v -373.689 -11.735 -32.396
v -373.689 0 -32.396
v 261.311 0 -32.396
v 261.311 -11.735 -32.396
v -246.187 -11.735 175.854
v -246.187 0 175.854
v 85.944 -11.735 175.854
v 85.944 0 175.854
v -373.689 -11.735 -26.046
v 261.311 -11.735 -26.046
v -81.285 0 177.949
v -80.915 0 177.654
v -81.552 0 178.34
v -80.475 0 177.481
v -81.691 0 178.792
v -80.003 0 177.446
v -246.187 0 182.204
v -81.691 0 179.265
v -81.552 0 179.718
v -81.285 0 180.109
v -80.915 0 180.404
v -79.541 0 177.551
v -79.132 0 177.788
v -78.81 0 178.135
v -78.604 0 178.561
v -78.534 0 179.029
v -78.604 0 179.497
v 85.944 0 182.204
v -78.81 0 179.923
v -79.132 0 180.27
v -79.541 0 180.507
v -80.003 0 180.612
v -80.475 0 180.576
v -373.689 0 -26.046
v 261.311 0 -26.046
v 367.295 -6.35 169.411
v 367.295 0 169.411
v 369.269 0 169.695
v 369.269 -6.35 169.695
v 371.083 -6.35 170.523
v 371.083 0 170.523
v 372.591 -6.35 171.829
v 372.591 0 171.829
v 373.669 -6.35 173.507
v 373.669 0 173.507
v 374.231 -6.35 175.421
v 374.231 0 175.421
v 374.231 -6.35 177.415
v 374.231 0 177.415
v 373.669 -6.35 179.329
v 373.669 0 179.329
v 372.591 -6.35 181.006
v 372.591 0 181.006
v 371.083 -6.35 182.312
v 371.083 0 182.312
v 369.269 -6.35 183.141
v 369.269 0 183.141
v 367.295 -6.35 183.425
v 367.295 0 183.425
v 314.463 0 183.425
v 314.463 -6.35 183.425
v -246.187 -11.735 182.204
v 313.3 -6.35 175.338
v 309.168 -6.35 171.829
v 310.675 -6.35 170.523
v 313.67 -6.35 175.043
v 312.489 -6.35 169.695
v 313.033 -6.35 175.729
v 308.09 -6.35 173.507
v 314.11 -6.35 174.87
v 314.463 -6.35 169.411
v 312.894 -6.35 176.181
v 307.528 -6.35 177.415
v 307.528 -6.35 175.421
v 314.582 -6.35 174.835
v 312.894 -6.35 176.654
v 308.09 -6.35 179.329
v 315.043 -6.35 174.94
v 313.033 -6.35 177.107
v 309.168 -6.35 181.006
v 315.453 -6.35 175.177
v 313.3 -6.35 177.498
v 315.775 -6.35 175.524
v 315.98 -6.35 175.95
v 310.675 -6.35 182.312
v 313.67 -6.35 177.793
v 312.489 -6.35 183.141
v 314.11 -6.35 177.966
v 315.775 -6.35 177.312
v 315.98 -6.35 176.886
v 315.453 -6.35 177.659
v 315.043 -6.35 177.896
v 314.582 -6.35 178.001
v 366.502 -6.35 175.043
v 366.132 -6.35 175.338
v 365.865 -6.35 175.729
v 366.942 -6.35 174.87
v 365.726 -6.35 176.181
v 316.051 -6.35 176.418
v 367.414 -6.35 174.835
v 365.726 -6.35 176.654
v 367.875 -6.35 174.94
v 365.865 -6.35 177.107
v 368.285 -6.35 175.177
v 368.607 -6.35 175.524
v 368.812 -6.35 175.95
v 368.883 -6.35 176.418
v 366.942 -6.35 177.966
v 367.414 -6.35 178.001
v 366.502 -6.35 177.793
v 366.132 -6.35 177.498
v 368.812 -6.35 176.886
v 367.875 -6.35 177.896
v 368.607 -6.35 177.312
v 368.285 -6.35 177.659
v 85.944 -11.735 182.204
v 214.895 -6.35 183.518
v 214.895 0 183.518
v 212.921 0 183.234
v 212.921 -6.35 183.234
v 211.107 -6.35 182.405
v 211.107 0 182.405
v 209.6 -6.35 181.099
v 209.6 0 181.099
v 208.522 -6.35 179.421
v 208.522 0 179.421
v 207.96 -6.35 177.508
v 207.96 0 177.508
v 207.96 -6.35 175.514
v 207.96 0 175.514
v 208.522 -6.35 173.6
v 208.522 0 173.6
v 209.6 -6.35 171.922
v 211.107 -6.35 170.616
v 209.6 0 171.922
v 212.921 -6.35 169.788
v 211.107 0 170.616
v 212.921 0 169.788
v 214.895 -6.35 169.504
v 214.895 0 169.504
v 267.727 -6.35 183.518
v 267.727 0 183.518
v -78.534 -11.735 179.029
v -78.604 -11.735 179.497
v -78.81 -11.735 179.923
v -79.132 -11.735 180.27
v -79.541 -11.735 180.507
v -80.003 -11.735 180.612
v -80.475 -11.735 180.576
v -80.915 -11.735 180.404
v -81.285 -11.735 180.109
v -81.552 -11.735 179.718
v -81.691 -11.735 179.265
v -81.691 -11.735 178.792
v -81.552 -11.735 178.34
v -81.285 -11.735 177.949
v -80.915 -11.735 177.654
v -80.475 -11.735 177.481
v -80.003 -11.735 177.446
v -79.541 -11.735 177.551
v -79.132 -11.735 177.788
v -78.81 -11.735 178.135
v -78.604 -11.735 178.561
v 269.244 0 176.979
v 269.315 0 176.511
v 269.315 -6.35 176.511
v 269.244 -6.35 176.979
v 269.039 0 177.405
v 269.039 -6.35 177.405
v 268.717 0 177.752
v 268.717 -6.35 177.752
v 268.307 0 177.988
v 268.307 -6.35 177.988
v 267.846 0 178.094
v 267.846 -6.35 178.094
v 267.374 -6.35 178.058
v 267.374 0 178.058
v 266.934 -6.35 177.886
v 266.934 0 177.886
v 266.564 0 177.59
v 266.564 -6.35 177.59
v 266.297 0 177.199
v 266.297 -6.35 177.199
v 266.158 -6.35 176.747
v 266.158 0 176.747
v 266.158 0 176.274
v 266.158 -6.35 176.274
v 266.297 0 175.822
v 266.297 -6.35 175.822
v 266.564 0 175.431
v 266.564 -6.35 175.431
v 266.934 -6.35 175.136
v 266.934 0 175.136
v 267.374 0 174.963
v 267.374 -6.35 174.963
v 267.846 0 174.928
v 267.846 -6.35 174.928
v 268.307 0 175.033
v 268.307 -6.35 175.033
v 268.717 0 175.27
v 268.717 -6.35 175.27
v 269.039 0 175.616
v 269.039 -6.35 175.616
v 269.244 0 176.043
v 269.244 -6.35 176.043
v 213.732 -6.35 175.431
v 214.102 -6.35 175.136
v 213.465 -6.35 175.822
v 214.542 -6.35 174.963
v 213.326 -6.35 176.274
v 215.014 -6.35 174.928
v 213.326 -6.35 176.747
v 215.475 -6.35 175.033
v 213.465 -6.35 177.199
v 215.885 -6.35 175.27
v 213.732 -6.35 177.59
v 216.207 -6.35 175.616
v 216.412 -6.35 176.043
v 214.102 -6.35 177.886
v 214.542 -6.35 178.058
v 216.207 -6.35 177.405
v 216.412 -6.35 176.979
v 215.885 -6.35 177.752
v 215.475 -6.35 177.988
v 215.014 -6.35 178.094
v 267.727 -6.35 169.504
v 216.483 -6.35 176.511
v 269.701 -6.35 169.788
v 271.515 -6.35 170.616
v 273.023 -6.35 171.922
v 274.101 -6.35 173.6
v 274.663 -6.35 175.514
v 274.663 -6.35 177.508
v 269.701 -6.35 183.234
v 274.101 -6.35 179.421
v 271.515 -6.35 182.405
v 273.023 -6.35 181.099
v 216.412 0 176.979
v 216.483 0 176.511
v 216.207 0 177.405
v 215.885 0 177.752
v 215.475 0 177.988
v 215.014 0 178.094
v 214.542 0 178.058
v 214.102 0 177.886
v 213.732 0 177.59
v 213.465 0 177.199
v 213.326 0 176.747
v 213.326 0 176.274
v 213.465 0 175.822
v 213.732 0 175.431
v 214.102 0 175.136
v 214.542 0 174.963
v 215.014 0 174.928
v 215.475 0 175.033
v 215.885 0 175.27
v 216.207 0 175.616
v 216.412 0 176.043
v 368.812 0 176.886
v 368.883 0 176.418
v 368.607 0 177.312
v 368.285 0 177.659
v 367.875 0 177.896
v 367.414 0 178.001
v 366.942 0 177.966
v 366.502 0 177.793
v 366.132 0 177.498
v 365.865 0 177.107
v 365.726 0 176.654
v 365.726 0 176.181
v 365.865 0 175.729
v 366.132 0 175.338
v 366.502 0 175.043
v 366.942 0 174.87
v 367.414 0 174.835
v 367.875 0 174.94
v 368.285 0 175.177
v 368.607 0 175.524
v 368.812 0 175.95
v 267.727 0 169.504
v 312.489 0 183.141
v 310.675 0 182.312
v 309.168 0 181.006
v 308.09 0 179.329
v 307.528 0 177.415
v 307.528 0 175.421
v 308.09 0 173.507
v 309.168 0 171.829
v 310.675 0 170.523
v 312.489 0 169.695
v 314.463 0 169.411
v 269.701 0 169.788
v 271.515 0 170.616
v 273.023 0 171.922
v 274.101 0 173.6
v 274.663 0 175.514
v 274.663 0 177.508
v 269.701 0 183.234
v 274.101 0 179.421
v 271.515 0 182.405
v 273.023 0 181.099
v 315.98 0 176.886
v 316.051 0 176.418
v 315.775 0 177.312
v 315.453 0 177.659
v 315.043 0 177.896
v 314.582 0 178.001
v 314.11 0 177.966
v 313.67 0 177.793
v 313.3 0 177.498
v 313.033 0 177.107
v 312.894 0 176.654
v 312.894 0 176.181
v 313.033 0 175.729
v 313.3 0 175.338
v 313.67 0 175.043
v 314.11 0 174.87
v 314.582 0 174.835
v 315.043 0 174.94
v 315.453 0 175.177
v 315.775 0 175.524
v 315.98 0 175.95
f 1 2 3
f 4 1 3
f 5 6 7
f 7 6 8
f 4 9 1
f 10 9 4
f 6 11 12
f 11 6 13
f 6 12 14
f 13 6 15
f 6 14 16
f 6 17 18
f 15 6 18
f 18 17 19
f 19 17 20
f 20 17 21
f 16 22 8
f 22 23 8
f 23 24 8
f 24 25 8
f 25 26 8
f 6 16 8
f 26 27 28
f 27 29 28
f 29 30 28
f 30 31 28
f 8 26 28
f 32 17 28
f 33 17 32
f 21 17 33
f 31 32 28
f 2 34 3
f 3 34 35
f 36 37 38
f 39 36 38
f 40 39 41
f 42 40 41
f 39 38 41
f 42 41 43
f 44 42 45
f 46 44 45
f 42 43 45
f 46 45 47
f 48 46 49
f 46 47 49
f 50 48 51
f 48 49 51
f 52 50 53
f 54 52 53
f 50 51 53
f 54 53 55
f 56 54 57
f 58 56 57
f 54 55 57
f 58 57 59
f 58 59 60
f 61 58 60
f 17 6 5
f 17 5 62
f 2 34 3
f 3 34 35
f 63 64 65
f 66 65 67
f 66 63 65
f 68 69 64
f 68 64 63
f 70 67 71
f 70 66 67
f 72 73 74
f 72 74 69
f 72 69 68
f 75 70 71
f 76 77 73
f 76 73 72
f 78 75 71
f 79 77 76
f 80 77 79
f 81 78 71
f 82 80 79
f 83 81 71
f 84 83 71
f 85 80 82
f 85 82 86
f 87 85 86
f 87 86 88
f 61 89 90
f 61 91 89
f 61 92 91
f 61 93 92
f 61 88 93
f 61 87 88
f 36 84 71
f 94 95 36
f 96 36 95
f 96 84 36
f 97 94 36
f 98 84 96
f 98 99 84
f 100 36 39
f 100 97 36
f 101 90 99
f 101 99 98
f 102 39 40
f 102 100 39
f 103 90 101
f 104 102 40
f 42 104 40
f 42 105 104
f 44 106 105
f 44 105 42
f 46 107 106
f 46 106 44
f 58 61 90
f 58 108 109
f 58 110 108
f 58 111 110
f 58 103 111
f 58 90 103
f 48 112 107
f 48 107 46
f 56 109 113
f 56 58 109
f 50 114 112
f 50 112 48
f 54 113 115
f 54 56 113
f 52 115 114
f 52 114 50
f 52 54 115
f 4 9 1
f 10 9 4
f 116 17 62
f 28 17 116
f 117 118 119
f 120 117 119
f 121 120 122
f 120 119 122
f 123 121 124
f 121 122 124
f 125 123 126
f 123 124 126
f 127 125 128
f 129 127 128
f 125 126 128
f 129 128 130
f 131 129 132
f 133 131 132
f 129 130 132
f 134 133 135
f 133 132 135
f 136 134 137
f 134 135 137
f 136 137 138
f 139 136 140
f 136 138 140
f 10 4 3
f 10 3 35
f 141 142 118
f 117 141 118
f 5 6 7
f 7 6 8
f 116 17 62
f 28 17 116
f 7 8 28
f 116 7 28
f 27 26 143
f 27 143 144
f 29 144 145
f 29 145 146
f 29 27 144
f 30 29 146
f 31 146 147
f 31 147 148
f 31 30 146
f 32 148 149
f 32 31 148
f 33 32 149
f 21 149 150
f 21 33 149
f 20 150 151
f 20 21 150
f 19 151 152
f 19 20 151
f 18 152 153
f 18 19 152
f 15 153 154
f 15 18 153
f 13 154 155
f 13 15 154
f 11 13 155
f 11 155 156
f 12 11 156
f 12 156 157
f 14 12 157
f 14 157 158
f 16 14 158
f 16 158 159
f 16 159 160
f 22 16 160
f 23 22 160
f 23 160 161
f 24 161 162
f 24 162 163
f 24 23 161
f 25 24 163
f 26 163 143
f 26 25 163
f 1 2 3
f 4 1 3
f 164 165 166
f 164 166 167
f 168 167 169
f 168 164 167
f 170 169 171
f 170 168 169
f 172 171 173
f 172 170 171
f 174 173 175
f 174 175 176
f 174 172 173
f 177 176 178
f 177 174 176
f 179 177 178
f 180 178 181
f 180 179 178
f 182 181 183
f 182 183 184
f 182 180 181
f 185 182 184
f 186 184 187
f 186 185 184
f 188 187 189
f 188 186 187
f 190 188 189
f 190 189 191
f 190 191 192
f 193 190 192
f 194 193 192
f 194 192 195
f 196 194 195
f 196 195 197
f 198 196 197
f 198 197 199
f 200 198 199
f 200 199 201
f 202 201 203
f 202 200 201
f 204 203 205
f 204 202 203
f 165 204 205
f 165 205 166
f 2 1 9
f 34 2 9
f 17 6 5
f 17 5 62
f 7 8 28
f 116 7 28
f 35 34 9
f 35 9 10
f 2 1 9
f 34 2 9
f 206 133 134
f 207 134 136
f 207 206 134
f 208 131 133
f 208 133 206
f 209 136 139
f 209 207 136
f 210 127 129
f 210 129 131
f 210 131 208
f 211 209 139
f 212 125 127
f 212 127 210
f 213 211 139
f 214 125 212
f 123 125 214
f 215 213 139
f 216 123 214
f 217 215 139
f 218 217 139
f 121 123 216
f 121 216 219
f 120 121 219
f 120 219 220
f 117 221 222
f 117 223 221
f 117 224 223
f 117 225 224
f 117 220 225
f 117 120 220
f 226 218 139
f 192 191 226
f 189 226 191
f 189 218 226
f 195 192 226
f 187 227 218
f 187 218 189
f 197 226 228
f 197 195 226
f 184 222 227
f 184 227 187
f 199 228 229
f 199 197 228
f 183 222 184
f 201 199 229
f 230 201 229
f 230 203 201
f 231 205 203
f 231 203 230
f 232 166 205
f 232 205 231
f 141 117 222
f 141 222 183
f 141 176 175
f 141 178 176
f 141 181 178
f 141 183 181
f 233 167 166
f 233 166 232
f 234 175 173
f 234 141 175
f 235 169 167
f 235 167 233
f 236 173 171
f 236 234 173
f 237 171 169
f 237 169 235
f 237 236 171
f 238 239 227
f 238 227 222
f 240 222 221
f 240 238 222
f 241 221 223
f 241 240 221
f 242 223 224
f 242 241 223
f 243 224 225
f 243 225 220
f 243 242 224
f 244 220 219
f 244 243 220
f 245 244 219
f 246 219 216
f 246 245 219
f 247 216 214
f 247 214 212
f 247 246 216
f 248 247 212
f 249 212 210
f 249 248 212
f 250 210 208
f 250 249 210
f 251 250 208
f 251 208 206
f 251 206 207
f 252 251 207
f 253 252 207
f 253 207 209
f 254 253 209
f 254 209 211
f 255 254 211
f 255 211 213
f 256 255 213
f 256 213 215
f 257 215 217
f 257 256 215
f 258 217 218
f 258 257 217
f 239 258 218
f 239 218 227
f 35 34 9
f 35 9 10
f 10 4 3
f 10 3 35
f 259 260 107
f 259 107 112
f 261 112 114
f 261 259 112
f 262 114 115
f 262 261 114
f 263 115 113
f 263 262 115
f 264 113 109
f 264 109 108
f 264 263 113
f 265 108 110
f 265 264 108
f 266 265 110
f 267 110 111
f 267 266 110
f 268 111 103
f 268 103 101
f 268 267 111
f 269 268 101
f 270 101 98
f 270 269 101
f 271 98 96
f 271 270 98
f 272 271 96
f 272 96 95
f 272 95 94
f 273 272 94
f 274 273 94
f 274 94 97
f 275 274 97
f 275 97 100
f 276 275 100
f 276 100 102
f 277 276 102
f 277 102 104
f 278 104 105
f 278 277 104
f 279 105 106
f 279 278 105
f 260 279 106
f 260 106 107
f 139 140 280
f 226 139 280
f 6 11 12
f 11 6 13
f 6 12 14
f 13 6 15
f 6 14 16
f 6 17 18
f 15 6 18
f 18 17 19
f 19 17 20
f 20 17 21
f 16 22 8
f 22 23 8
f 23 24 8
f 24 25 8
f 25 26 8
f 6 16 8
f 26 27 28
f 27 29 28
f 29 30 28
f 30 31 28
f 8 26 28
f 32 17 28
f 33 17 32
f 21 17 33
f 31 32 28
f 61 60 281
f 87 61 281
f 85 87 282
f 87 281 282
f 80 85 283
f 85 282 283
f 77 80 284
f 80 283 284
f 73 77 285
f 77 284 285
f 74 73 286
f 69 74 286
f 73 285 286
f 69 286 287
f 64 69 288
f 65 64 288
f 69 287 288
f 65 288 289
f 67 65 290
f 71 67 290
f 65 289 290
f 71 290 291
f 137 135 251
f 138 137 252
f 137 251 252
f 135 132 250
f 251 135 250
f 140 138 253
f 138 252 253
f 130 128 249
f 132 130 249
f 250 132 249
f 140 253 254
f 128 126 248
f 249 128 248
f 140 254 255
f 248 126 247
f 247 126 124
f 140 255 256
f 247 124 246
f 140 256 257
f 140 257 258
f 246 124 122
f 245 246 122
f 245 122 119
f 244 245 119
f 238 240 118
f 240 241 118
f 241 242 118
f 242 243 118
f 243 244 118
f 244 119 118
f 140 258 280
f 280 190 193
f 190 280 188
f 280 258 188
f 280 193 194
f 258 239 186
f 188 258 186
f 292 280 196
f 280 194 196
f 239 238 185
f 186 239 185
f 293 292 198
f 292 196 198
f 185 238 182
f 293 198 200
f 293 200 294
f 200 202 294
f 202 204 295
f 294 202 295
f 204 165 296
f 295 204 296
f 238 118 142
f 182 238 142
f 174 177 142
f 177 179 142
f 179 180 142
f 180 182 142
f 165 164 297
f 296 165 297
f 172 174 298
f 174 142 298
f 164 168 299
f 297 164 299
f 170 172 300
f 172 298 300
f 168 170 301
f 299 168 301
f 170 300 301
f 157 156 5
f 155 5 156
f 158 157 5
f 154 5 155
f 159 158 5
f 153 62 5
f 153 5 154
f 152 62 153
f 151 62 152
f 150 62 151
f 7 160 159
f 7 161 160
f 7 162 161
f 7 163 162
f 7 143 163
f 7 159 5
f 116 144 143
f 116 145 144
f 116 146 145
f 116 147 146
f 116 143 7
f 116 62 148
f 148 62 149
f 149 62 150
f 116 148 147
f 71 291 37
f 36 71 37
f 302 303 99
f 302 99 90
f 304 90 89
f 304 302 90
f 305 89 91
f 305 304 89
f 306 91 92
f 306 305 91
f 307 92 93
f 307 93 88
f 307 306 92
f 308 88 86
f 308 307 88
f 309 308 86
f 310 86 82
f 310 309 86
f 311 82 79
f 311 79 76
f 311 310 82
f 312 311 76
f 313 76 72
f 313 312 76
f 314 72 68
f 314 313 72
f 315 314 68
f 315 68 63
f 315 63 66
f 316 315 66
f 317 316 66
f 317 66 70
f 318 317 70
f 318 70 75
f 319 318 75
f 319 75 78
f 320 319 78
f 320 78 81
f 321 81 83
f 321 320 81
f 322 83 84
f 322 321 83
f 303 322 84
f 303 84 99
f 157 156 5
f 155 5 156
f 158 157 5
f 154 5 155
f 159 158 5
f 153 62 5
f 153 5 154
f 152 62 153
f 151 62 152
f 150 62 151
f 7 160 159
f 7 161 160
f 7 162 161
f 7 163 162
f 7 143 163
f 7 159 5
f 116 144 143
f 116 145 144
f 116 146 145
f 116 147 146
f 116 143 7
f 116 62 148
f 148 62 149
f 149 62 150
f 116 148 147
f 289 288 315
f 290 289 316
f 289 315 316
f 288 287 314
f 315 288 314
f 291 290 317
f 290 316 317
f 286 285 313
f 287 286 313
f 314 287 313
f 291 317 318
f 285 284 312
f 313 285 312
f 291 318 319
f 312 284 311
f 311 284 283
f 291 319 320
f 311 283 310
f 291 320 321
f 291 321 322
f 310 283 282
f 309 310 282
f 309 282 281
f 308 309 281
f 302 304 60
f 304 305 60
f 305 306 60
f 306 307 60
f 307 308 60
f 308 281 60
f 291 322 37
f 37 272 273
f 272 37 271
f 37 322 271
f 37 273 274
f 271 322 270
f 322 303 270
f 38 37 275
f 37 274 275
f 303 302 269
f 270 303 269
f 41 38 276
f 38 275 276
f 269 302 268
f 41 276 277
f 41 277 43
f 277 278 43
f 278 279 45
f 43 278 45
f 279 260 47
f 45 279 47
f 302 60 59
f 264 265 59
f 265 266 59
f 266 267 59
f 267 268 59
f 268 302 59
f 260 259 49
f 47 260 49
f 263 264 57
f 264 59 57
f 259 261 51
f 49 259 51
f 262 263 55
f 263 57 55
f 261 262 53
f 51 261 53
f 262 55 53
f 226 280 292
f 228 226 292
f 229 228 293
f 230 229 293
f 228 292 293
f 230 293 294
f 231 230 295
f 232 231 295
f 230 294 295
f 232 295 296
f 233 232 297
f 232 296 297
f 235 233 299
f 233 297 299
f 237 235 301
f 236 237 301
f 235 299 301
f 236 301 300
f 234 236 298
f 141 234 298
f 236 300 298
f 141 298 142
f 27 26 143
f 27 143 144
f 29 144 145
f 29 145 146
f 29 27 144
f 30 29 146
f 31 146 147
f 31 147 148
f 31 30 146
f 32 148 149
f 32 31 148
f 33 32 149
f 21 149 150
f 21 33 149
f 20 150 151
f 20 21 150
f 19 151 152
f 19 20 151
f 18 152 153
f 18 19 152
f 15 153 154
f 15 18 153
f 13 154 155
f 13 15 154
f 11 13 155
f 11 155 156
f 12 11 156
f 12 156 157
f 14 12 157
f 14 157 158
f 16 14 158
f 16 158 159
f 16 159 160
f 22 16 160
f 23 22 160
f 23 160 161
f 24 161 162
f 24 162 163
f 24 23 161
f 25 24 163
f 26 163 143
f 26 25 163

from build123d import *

# Parameters (mm, degrees)
F0_W     = 635
F0_H     = 6.35
F0_W_2   = 332.1304
F0_R     = 1.5875
F1_DEPTH = 11.7348
F2_DEPTH = 11.7348
F3_R     = 1.5875
F4_DEPTH = 6.35


with BuildPart() as f1:
    # F0 (on Front) → F1 (new body)
    with BuildSketch(Plane.XZ):
        with Locations((-56.189019, -29.221167)):
            Rectangle(F0_W, F0_H)
        with Locations((-80.121399, 179.028774)):
            Rectangle(F0_W_2, F0_H)
        with Locations((-80.121399, 179.028774)):
            Circle(F0_R, mode=Mode.SUBTRACT)
    extrude(amount=F1_DEPTH)


with BuildPart() as f2:
    # F0 (on Front) → F2 (new body)
    with BuildSketch(Plane.XZ):
        with Locations((-56.189019, -29.221167)):
            Rectangle(F0_W, F0_H)
        with Locations((-80.121399, 179.028774)):
            Rectangle(F0_W_2, F0_H)
        with Locations((-80.121399, 179.028774)):
            Circle(F0_R, mode=Mode.SUBTRACT)
    extrude(amount=F2_DEPTH)


with BuildPart() as f4:
    # F3 (on Front) → F4 (new body)
    with BuildSketch(Plane.XZ):
        with BuildLine():
            Line((267.727276, 183.517592), (214.895276, 183.517592))
            ThreePointArc((214.895276, 183.517592), (207.888375, 176.510692), (214.895276, 169.503791))
            Line((214.895276, 169.503791), (267.727276, 169.503791))
            ThreePointArc((267.727276, 169.503791), (274.734177, 176.510692), (267.727276, 183.517592))
        make_face()
        with Locations((214.895276, 176.510692)):
            Circle(F3_R, mode=Mode.SUBTRACT)
        with Locations((267.727276, 176.510692)):
            Circle(F3_R, mode=Mode.SUBTRACT)
        with BuildLine():
            Line((367.295276, 183.424743), (314.463276, 183.424743))
            ThreePointArc((314.463276, 183.424743), (307.456375, 176.417843), (314.463276, 169.410942))
            Line((314.463276, 169.410942), (367.295276, 169.410942))
            ThreePointArc((367.295276, 169.410942), (374.302177, 176.417843), (367.295276, 183.424743))
        make_face()
        with Locations((314.463276, 176.417843)):
            Circle(F3_R, mode=Mode.SUBTRACT)
        with Locations((367.295276, 176.417843)):
            Circle(F3_R, mode=Mode.SUBTRACT)
    extrude(amount=F4_DEPTH)


solid = Compound([f1.part, f2.part, f4.part])
